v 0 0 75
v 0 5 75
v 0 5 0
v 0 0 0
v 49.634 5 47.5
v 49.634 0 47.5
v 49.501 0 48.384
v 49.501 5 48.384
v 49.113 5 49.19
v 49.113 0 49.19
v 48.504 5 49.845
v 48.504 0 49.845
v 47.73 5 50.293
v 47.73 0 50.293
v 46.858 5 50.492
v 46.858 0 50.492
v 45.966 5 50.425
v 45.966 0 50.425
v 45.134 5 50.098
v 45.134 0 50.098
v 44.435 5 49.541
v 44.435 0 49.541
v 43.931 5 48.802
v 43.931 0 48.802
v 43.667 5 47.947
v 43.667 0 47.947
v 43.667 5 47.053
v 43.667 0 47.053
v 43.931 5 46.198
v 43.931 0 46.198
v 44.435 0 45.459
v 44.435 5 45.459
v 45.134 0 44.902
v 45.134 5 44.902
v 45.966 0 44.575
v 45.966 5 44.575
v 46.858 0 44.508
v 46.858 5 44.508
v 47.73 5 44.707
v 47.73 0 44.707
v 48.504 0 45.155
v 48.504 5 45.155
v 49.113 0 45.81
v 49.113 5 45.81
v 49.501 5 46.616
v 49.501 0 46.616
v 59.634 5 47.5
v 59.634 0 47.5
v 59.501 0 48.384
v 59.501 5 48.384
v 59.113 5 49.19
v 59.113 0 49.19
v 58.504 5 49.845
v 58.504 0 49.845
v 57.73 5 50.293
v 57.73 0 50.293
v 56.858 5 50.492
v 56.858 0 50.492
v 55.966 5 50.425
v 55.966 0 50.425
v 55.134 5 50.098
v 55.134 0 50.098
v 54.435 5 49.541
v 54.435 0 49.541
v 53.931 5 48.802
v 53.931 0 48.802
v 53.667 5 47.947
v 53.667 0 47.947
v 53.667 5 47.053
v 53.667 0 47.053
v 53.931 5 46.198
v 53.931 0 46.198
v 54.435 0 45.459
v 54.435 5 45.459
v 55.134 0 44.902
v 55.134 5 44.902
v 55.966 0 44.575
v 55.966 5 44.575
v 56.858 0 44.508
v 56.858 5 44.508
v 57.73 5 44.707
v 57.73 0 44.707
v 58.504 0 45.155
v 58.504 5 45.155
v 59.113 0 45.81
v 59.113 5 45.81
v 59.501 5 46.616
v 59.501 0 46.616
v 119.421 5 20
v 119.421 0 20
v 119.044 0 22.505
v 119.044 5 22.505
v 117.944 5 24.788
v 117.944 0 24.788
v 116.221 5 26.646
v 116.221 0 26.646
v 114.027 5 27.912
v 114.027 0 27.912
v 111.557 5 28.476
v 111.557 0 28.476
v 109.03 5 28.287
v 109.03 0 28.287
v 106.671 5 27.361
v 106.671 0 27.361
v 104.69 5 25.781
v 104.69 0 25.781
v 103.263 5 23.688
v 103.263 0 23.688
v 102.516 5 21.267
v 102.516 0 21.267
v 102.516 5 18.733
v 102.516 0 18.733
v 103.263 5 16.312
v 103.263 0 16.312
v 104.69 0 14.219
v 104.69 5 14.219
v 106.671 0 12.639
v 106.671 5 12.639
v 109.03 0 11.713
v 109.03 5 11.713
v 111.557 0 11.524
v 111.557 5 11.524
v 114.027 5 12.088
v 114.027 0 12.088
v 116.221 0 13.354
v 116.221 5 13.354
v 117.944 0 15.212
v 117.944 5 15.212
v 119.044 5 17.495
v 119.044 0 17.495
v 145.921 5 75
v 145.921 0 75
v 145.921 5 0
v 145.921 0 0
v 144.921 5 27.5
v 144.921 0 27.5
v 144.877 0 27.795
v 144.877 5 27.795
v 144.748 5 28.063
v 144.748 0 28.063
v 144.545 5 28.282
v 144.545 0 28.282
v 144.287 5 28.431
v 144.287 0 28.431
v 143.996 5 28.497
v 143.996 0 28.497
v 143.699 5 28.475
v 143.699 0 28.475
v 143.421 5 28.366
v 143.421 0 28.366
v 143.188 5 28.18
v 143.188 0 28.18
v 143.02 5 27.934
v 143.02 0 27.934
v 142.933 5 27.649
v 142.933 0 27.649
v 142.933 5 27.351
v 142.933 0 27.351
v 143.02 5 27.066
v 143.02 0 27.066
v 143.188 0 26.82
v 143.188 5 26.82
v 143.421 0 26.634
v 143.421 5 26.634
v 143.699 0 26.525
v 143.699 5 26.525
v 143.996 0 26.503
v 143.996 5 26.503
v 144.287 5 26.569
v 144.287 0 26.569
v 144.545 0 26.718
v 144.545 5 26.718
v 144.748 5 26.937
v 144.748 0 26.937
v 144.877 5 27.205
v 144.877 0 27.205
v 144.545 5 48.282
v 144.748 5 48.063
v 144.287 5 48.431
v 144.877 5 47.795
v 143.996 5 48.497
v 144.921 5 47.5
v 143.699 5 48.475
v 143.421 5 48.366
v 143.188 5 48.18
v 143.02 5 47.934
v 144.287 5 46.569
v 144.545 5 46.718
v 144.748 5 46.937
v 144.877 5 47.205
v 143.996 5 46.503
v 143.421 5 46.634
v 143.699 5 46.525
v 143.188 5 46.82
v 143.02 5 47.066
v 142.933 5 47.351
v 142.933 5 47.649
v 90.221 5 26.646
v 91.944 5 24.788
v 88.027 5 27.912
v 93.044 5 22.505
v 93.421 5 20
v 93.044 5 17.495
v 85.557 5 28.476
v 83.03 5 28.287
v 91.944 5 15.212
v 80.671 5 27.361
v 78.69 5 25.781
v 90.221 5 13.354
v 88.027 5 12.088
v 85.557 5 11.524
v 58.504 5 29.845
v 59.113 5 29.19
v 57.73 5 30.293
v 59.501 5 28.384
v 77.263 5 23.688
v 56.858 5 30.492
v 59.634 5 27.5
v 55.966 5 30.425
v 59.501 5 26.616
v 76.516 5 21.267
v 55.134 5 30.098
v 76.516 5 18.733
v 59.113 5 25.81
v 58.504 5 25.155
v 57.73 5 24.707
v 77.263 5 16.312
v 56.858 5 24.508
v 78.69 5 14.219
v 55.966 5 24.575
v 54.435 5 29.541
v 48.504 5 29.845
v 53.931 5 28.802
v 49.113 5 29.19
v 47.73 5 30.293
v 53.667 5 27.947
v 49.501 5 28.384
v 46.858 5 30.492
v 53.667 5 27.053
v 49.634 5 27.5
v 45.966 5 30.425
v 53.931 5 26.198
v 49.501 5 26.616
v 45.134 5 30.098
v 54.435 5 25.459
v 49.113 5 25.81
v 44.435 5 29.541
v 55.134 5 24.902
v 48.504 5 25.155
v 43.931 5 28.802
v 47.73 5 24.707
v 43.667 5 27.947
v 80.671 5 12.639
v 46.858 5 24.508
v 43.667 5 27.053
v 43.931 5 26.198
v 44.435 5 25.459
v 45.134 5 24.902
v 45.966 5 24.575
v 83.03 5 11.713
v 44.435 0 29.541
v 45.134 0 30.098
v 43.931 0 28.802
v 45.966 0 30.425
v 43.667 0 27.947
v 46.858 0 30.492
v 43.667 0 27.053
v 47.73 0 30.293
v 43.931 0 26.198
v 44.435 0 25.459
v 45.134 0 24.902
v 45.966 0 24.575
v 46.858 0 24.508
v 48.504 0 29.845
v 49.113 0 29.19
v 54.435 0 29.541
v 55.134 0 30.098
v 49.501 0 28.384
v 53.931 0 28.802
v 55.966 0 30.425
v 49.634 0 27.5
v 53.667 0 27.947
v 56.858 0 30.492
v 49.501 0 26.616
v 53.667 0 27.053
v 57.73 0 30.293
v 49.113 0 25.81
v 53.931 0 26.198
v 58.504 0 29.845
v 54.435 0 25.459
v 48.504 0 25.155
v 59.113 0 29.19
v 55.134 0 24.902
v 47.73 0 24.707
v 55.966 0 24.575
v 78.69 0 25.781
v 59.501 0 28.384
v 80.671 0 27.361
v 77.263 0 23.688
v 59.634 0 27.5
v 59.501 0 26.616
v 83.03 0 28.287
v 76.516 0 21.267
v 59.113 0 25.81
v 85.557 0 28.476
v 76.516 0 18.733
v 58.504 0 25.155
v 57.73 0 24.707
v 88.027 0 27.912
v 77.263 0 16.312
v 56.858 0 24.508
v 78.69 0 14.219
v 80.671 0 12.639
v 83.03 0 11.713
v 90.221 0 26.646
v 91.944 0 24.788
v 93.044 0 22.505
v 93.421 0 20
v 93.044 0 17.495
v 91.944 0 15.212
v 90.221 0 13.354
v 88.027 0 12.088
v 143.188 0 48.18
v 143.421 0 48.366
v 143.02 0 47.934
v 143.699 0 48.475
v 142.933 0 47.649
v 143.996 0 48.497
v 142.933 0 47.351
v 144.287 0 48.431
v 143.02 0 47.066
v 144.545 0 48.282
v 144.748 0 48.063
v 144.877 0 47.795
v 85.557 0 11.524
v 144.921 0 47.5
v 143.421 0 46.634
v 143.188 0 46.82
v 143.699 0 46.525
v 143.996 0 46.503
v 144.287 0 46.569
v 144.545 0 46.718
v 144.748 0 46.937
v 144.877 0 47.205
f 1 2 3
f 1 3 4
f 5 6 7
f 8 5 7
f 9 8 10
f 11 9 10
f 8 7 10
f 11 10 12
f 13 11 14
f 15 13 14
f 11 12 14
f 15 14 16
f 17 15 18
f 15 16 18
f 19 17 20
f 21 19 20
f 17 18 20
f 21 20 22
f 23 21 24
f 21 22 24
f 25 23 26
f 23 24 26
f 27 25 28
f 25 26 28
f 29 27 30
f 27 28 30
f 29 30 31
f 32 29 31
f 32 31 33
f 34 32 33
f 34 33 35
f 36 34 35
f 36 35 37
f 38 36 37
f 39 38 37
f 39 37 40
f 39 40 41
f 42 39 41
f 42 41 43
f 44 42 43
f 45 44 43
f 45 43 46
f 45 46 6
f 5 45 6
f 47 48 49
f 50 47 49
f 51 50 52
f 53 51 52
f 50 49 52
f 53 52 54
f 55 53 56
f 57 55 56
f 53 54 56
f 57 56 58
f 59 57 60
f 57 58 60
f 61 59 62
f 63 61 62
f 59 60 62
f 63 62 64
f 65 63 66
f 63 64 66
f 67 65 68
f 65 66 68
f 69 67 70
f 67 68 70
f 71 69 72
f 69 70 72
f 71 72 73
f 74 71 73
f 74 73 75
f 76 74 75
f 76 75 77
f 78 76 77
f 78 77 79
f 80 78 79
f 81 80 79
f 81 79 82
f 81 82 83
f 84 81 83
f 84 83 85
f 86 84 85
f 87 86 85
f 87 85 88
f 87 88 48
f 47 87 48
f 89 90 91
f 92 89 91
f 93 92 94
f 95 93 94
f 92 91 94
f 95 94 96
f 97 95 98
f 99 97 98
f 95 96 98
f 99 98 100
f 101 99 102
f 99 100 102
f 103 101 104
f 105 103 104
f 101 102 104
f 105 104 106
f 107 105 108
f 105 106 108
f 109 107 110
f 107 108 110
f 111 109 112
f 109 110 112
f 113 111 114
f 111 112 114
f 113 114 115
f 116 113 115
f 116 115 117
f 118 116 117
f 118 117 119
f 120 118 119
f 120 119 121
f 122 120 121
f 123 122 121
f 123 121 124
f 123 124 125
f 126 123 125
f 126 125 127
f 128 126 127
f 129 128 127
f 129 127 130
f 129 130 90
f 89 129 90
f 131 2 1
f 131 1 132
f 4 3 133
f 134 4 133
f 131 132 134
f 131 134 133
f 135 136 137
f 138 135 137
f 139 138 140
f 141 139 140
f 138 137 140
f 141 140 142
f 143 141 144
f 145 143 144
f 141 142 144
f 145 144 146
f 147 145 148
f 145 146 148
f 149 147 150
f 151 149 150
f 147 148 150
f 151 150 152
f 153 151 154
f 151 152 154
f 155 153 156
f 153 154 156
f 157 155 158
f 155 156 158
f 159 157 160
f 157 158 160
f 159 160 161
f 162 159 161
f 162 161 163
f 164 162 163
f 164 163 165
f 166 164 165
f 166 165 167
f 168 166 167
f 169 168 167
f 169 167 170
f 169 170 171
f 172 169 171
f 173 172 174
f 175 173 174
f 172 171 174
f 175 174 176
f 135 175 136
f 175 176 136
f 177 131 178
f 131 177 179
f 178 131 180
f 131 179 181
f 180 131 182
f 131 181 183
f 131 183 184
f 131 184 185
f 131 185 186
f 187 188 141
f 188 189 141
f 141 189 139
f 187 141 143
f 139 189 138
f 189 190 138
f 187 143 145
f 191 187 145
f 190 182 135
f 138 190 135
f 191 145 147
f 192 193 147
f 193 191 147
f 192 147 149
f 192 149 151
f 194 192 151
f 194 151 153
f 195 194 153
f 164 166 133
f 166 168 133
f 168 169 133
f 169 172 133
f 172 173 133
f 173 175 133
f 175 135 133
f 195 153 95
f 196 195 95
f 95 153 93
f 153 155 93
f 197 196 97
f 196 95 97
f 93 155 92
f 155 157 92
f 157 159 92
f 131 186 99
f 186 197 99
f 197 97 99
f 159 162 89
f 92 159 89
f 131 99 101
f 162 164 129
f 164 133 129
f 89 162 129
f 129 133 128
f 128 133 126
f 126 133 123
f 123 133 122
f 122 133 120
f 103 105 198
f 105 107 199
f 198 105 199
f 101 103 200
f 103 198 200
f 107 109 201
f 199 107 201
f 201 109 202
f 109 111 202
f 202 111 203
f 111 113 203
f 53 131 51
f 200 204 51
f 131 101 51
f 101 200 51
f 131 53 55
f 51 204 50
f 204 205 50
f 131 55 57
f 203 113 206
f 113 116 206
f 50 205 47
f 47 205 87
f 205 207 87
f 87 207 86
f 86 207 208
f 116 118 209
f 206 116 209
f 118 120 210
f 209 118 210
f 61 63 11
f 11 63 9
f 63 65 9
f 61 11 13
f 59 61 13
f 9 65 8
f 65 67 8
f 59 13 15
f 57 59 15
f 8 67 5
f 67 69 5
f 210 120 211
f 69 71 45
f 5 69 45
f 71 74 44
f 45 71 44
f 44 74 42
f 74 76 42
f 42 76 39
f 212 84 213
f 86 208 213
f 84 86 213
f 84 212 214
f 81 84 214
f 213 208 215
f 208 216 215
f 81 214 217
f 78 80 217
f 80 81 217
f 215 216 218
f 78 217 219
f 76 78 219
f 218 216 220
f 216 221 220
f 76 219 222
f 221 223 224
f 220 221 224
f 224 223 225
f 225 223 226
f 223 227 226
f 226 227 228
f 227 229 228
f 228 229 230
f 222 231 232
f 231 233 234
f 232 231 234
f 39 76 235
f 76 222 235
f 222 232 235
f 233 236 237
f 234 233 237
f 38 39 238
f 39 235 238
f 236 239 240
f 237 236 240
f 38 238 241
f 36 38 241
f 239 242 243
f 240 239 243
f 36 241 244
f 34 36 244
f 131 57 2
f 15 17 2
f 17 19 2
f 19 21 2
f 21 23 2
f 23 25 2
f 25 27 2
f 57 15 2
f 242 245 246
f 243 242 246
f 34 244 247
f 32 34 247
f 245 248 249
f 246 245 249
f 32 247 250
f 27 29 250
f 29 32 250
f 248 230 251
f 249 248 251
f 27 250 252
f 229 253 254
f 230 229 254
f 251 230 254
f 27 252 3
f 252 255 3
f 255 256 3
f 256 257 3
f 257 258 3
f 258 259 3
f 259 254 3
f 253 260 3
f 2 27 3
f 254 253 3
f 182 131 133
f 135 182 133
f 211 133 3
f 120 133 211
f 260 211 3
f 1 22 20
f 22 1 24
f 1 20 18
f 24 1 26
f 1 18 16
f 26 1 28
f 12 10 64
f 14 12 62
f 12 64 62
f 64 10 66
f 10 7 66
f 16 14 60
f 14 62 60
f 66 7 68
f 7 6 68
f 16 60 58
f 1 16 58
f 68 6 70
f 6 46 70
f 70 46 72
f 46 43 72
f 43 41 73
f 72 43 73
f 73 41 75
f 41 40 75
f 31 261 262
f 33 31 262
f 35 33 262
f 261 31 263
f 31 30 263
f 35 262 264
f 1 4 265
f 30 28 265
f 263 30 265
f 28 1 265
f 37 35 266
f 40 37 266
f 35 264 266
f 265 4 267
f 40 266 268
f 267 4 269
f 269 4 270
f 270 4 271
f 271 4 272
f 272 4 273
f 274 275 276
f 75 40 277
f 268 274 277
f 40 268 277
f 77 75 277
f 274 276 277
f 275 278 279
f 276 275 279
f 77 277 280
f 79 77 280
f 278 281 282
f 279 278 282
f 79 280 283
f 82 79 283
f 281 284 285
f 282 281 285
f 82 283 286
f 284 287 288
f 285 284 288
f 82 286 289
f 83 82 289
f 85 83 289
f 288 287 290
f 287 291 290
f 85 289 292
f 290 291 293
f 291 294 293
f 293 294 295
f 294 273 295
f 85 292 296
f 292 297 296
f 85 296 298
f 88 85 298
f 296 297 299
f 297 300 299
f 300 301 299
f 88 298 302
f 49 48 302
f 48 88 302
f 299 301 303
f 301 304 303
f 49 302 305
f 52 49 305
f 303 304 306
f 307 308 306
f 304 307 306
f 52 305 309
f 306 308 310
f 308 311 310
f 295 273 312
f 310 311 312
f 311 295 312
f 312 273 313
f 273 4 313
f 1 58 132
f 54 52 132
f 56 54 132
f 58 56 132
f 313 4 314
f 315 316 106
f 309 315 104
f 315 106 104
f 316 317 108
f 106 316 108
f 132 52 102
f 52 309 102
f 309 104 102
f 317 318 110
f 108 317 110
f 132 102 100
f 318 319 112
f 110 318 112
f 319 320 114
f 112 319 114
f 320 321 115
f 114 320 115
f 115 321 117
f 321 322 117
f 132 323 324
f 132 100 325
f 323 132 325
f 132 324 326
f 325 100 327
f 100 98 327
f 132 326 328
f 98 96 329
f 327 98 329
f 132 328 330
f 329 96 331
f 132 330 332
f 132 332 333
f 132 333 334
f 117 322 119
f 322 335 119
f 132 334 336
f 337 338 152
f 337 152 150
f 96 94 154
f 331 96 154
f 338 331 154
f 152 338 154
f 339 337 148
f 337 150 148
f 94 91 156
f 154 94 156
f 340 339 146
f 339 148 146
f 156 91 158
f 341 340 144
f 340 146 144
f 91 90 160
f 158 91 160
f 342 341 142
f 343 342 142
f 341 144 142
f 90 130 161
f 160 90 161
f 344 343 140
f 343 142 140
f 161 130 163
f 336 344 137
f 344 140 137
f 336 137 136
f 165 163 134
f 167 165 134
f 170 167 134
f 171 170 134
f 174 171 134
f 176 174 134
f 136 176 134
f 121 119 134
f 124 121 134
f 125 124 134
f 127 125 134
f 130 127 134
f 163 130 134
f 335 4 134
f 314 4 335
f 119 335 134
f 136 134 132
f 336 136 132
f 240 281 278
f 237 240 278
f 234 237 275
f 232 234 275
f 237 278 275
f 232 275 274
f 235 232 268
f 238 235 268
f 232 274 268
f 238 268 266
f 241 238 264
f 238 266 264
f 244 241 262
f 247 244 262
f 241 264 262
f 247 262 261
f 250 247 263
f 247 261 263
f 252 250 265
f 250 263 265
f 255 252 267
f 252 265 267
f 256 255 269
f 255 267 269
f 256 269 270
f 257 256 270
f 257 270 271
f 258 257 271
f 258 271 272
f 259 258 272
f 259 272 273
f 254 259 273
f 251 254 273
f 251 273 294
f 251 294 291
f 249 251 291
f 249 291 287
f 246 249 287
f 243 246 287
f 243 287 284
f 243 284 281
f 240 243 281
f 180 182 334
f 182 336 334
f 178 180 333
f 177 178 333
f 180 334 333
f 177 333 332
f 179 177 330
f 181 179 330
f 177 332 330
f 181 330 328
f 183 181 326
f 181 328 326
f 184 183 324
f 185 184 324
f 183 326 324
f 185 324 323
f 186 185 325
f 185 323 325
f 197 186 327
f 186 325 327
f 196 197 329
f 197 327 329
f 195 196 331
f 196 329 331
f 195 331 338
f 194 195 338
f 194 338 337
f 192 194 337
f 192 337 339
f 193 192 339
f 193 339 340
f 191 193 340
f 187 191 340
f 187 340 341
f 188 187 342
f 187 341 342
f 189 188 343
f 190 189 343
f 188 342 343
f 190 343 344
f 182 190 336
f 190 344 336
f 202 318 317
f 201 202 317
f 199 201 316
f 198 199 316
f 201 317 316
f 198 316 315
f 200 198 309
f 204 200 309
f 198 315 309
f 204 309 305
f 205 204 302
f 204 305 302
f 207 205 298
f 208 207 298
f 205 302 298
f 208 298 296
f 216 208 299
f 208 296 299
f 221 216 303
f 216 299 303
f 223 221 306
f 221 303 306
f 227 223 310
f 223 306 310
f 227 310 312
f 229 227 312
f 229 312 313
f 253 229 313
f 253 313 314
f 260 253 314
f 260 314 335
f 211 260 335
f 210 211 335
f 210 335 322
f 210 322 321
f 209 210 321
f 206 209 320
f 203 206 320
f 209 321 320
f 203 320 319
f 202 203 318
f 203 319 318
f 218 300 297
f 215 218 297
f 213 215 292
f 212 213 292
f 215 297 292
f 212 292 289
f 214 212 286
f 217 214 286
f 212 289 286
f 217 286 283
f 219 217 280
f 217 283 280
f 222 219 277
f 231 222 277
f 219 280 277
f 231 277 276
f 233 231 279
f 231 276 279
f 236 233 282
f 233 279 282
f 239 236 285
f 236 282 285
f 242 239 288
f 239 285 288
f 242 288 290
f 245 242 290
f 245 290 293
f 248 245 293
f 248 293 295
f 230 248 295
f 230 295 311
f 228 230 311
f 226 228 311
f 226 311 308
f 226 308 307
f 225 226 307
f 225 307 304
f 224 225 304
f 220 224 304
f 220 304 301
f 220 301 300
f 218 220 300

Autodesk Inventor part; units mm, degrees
ref_plane "YZ Plane" through (0, 0, 0) normal (1, 0, 0) x (0, 1, 0)
ref_plane "XZ Plane" through (0, 0, 0) normal (0, 1, 0) x (-1, 0, 0)
ref_plane "XY Plane" through (0, 0, 0) normal (0, 0, 1) x (1, 0, 0)
sketch "Sketch1" plane through (0, 0, 0) normal (0, 0, 1) x (1, 0, 0)
  line L0 (0, 0) -> (145.9214, 0)
  line L1 (145.9214, 0) -> (145.9214, 5)
  line L2 (145.9214, 5) -> (0, 5)
  line L3 (0, 5) -> (0, 0)
  dimension "d0" = 145.9214
  dimension "d1" = 5
extrude "Extrusion1" add sketch "Sketch1" along normal blind 75
sketch "Sketch2" plane through (0, 0, 0) normal (0, -1, 0) x (1, 0, 0)
  circle A0 centre (46.6338, 27.5) radius 3
  line L0 (0, 0) -> (145.9214, 0) projected
  line L1 (0, 0) -> (0, 75) projected
  circle A1 centre (46.6338, 47.5) radius 3
  circle A2 centre (56.6338, 47.5) radius 3
  circle A3 centre (56.6338, 27.5) radius 3
  dimension "d4" = 6
  dimension "d5" = 27.5
  dimension "d6" = 46.6338
  dimension "d7" = 6
  dimension "d8" = 20
  dimension "d9" = 6
  dimension "d10" = 6
  dimension "d11" = 10
extrude "Extrusion2" cut sketch "Sketch2" against normal through all
sketch "Sketch3" plane through (0, 0, 0) normal (0, -1, 0) x (1, 0, 0)
  circle A0 centre (46.6338, 27.5) radius 3 projected
  circle A1 centre (143.9214, 27.5) radius 1
  circle A2 centre (143.9214, 47.5) radius 1
  circle A3 centre (46.6338, 47.5) radius 3 projected
  line L0 (145.9214, 0) -> (145.9214, 75) projected
  point P0 (0, 0)
  dimension "d22" = 2
  dimension "d23" = 2
  dimension "d24" = 2
extrude "Extrusion3" cut sketch "Sketch3" against normal through all contours A1 | A2
thread "Thread7" size "M2x0.4" class "6H" standard "ANSI Metric M Profile" full length
thread "Thread8" size "M2x0.4" class "6H" standard "ANSI Metric M Profile" full length
sketch "Sketch4" plane through (0, 0, 0) normal (0, -1, 0) x (1, 0, 0)
  circle A0 centre (110.9214, 20) radius 8.5
  line L0 (145.9214, 0) -> (145.9214, 75) projected
  line L1 (0, 75) -> (145.9214, 75) projected
  circle A1 centre (84.9214, 20) radius 8.5
  point P0 (0, 0)
  dimension "d35" = 17
  dimension "d36" = 35
  dimension "d38" = 17
  dimension "d39" = 26
  dimension "d42" = 20
extrude "Extrusion4" cut sketch "Sketch4" against normal through all
properties part number "CW001" material "ABS Plastic"
